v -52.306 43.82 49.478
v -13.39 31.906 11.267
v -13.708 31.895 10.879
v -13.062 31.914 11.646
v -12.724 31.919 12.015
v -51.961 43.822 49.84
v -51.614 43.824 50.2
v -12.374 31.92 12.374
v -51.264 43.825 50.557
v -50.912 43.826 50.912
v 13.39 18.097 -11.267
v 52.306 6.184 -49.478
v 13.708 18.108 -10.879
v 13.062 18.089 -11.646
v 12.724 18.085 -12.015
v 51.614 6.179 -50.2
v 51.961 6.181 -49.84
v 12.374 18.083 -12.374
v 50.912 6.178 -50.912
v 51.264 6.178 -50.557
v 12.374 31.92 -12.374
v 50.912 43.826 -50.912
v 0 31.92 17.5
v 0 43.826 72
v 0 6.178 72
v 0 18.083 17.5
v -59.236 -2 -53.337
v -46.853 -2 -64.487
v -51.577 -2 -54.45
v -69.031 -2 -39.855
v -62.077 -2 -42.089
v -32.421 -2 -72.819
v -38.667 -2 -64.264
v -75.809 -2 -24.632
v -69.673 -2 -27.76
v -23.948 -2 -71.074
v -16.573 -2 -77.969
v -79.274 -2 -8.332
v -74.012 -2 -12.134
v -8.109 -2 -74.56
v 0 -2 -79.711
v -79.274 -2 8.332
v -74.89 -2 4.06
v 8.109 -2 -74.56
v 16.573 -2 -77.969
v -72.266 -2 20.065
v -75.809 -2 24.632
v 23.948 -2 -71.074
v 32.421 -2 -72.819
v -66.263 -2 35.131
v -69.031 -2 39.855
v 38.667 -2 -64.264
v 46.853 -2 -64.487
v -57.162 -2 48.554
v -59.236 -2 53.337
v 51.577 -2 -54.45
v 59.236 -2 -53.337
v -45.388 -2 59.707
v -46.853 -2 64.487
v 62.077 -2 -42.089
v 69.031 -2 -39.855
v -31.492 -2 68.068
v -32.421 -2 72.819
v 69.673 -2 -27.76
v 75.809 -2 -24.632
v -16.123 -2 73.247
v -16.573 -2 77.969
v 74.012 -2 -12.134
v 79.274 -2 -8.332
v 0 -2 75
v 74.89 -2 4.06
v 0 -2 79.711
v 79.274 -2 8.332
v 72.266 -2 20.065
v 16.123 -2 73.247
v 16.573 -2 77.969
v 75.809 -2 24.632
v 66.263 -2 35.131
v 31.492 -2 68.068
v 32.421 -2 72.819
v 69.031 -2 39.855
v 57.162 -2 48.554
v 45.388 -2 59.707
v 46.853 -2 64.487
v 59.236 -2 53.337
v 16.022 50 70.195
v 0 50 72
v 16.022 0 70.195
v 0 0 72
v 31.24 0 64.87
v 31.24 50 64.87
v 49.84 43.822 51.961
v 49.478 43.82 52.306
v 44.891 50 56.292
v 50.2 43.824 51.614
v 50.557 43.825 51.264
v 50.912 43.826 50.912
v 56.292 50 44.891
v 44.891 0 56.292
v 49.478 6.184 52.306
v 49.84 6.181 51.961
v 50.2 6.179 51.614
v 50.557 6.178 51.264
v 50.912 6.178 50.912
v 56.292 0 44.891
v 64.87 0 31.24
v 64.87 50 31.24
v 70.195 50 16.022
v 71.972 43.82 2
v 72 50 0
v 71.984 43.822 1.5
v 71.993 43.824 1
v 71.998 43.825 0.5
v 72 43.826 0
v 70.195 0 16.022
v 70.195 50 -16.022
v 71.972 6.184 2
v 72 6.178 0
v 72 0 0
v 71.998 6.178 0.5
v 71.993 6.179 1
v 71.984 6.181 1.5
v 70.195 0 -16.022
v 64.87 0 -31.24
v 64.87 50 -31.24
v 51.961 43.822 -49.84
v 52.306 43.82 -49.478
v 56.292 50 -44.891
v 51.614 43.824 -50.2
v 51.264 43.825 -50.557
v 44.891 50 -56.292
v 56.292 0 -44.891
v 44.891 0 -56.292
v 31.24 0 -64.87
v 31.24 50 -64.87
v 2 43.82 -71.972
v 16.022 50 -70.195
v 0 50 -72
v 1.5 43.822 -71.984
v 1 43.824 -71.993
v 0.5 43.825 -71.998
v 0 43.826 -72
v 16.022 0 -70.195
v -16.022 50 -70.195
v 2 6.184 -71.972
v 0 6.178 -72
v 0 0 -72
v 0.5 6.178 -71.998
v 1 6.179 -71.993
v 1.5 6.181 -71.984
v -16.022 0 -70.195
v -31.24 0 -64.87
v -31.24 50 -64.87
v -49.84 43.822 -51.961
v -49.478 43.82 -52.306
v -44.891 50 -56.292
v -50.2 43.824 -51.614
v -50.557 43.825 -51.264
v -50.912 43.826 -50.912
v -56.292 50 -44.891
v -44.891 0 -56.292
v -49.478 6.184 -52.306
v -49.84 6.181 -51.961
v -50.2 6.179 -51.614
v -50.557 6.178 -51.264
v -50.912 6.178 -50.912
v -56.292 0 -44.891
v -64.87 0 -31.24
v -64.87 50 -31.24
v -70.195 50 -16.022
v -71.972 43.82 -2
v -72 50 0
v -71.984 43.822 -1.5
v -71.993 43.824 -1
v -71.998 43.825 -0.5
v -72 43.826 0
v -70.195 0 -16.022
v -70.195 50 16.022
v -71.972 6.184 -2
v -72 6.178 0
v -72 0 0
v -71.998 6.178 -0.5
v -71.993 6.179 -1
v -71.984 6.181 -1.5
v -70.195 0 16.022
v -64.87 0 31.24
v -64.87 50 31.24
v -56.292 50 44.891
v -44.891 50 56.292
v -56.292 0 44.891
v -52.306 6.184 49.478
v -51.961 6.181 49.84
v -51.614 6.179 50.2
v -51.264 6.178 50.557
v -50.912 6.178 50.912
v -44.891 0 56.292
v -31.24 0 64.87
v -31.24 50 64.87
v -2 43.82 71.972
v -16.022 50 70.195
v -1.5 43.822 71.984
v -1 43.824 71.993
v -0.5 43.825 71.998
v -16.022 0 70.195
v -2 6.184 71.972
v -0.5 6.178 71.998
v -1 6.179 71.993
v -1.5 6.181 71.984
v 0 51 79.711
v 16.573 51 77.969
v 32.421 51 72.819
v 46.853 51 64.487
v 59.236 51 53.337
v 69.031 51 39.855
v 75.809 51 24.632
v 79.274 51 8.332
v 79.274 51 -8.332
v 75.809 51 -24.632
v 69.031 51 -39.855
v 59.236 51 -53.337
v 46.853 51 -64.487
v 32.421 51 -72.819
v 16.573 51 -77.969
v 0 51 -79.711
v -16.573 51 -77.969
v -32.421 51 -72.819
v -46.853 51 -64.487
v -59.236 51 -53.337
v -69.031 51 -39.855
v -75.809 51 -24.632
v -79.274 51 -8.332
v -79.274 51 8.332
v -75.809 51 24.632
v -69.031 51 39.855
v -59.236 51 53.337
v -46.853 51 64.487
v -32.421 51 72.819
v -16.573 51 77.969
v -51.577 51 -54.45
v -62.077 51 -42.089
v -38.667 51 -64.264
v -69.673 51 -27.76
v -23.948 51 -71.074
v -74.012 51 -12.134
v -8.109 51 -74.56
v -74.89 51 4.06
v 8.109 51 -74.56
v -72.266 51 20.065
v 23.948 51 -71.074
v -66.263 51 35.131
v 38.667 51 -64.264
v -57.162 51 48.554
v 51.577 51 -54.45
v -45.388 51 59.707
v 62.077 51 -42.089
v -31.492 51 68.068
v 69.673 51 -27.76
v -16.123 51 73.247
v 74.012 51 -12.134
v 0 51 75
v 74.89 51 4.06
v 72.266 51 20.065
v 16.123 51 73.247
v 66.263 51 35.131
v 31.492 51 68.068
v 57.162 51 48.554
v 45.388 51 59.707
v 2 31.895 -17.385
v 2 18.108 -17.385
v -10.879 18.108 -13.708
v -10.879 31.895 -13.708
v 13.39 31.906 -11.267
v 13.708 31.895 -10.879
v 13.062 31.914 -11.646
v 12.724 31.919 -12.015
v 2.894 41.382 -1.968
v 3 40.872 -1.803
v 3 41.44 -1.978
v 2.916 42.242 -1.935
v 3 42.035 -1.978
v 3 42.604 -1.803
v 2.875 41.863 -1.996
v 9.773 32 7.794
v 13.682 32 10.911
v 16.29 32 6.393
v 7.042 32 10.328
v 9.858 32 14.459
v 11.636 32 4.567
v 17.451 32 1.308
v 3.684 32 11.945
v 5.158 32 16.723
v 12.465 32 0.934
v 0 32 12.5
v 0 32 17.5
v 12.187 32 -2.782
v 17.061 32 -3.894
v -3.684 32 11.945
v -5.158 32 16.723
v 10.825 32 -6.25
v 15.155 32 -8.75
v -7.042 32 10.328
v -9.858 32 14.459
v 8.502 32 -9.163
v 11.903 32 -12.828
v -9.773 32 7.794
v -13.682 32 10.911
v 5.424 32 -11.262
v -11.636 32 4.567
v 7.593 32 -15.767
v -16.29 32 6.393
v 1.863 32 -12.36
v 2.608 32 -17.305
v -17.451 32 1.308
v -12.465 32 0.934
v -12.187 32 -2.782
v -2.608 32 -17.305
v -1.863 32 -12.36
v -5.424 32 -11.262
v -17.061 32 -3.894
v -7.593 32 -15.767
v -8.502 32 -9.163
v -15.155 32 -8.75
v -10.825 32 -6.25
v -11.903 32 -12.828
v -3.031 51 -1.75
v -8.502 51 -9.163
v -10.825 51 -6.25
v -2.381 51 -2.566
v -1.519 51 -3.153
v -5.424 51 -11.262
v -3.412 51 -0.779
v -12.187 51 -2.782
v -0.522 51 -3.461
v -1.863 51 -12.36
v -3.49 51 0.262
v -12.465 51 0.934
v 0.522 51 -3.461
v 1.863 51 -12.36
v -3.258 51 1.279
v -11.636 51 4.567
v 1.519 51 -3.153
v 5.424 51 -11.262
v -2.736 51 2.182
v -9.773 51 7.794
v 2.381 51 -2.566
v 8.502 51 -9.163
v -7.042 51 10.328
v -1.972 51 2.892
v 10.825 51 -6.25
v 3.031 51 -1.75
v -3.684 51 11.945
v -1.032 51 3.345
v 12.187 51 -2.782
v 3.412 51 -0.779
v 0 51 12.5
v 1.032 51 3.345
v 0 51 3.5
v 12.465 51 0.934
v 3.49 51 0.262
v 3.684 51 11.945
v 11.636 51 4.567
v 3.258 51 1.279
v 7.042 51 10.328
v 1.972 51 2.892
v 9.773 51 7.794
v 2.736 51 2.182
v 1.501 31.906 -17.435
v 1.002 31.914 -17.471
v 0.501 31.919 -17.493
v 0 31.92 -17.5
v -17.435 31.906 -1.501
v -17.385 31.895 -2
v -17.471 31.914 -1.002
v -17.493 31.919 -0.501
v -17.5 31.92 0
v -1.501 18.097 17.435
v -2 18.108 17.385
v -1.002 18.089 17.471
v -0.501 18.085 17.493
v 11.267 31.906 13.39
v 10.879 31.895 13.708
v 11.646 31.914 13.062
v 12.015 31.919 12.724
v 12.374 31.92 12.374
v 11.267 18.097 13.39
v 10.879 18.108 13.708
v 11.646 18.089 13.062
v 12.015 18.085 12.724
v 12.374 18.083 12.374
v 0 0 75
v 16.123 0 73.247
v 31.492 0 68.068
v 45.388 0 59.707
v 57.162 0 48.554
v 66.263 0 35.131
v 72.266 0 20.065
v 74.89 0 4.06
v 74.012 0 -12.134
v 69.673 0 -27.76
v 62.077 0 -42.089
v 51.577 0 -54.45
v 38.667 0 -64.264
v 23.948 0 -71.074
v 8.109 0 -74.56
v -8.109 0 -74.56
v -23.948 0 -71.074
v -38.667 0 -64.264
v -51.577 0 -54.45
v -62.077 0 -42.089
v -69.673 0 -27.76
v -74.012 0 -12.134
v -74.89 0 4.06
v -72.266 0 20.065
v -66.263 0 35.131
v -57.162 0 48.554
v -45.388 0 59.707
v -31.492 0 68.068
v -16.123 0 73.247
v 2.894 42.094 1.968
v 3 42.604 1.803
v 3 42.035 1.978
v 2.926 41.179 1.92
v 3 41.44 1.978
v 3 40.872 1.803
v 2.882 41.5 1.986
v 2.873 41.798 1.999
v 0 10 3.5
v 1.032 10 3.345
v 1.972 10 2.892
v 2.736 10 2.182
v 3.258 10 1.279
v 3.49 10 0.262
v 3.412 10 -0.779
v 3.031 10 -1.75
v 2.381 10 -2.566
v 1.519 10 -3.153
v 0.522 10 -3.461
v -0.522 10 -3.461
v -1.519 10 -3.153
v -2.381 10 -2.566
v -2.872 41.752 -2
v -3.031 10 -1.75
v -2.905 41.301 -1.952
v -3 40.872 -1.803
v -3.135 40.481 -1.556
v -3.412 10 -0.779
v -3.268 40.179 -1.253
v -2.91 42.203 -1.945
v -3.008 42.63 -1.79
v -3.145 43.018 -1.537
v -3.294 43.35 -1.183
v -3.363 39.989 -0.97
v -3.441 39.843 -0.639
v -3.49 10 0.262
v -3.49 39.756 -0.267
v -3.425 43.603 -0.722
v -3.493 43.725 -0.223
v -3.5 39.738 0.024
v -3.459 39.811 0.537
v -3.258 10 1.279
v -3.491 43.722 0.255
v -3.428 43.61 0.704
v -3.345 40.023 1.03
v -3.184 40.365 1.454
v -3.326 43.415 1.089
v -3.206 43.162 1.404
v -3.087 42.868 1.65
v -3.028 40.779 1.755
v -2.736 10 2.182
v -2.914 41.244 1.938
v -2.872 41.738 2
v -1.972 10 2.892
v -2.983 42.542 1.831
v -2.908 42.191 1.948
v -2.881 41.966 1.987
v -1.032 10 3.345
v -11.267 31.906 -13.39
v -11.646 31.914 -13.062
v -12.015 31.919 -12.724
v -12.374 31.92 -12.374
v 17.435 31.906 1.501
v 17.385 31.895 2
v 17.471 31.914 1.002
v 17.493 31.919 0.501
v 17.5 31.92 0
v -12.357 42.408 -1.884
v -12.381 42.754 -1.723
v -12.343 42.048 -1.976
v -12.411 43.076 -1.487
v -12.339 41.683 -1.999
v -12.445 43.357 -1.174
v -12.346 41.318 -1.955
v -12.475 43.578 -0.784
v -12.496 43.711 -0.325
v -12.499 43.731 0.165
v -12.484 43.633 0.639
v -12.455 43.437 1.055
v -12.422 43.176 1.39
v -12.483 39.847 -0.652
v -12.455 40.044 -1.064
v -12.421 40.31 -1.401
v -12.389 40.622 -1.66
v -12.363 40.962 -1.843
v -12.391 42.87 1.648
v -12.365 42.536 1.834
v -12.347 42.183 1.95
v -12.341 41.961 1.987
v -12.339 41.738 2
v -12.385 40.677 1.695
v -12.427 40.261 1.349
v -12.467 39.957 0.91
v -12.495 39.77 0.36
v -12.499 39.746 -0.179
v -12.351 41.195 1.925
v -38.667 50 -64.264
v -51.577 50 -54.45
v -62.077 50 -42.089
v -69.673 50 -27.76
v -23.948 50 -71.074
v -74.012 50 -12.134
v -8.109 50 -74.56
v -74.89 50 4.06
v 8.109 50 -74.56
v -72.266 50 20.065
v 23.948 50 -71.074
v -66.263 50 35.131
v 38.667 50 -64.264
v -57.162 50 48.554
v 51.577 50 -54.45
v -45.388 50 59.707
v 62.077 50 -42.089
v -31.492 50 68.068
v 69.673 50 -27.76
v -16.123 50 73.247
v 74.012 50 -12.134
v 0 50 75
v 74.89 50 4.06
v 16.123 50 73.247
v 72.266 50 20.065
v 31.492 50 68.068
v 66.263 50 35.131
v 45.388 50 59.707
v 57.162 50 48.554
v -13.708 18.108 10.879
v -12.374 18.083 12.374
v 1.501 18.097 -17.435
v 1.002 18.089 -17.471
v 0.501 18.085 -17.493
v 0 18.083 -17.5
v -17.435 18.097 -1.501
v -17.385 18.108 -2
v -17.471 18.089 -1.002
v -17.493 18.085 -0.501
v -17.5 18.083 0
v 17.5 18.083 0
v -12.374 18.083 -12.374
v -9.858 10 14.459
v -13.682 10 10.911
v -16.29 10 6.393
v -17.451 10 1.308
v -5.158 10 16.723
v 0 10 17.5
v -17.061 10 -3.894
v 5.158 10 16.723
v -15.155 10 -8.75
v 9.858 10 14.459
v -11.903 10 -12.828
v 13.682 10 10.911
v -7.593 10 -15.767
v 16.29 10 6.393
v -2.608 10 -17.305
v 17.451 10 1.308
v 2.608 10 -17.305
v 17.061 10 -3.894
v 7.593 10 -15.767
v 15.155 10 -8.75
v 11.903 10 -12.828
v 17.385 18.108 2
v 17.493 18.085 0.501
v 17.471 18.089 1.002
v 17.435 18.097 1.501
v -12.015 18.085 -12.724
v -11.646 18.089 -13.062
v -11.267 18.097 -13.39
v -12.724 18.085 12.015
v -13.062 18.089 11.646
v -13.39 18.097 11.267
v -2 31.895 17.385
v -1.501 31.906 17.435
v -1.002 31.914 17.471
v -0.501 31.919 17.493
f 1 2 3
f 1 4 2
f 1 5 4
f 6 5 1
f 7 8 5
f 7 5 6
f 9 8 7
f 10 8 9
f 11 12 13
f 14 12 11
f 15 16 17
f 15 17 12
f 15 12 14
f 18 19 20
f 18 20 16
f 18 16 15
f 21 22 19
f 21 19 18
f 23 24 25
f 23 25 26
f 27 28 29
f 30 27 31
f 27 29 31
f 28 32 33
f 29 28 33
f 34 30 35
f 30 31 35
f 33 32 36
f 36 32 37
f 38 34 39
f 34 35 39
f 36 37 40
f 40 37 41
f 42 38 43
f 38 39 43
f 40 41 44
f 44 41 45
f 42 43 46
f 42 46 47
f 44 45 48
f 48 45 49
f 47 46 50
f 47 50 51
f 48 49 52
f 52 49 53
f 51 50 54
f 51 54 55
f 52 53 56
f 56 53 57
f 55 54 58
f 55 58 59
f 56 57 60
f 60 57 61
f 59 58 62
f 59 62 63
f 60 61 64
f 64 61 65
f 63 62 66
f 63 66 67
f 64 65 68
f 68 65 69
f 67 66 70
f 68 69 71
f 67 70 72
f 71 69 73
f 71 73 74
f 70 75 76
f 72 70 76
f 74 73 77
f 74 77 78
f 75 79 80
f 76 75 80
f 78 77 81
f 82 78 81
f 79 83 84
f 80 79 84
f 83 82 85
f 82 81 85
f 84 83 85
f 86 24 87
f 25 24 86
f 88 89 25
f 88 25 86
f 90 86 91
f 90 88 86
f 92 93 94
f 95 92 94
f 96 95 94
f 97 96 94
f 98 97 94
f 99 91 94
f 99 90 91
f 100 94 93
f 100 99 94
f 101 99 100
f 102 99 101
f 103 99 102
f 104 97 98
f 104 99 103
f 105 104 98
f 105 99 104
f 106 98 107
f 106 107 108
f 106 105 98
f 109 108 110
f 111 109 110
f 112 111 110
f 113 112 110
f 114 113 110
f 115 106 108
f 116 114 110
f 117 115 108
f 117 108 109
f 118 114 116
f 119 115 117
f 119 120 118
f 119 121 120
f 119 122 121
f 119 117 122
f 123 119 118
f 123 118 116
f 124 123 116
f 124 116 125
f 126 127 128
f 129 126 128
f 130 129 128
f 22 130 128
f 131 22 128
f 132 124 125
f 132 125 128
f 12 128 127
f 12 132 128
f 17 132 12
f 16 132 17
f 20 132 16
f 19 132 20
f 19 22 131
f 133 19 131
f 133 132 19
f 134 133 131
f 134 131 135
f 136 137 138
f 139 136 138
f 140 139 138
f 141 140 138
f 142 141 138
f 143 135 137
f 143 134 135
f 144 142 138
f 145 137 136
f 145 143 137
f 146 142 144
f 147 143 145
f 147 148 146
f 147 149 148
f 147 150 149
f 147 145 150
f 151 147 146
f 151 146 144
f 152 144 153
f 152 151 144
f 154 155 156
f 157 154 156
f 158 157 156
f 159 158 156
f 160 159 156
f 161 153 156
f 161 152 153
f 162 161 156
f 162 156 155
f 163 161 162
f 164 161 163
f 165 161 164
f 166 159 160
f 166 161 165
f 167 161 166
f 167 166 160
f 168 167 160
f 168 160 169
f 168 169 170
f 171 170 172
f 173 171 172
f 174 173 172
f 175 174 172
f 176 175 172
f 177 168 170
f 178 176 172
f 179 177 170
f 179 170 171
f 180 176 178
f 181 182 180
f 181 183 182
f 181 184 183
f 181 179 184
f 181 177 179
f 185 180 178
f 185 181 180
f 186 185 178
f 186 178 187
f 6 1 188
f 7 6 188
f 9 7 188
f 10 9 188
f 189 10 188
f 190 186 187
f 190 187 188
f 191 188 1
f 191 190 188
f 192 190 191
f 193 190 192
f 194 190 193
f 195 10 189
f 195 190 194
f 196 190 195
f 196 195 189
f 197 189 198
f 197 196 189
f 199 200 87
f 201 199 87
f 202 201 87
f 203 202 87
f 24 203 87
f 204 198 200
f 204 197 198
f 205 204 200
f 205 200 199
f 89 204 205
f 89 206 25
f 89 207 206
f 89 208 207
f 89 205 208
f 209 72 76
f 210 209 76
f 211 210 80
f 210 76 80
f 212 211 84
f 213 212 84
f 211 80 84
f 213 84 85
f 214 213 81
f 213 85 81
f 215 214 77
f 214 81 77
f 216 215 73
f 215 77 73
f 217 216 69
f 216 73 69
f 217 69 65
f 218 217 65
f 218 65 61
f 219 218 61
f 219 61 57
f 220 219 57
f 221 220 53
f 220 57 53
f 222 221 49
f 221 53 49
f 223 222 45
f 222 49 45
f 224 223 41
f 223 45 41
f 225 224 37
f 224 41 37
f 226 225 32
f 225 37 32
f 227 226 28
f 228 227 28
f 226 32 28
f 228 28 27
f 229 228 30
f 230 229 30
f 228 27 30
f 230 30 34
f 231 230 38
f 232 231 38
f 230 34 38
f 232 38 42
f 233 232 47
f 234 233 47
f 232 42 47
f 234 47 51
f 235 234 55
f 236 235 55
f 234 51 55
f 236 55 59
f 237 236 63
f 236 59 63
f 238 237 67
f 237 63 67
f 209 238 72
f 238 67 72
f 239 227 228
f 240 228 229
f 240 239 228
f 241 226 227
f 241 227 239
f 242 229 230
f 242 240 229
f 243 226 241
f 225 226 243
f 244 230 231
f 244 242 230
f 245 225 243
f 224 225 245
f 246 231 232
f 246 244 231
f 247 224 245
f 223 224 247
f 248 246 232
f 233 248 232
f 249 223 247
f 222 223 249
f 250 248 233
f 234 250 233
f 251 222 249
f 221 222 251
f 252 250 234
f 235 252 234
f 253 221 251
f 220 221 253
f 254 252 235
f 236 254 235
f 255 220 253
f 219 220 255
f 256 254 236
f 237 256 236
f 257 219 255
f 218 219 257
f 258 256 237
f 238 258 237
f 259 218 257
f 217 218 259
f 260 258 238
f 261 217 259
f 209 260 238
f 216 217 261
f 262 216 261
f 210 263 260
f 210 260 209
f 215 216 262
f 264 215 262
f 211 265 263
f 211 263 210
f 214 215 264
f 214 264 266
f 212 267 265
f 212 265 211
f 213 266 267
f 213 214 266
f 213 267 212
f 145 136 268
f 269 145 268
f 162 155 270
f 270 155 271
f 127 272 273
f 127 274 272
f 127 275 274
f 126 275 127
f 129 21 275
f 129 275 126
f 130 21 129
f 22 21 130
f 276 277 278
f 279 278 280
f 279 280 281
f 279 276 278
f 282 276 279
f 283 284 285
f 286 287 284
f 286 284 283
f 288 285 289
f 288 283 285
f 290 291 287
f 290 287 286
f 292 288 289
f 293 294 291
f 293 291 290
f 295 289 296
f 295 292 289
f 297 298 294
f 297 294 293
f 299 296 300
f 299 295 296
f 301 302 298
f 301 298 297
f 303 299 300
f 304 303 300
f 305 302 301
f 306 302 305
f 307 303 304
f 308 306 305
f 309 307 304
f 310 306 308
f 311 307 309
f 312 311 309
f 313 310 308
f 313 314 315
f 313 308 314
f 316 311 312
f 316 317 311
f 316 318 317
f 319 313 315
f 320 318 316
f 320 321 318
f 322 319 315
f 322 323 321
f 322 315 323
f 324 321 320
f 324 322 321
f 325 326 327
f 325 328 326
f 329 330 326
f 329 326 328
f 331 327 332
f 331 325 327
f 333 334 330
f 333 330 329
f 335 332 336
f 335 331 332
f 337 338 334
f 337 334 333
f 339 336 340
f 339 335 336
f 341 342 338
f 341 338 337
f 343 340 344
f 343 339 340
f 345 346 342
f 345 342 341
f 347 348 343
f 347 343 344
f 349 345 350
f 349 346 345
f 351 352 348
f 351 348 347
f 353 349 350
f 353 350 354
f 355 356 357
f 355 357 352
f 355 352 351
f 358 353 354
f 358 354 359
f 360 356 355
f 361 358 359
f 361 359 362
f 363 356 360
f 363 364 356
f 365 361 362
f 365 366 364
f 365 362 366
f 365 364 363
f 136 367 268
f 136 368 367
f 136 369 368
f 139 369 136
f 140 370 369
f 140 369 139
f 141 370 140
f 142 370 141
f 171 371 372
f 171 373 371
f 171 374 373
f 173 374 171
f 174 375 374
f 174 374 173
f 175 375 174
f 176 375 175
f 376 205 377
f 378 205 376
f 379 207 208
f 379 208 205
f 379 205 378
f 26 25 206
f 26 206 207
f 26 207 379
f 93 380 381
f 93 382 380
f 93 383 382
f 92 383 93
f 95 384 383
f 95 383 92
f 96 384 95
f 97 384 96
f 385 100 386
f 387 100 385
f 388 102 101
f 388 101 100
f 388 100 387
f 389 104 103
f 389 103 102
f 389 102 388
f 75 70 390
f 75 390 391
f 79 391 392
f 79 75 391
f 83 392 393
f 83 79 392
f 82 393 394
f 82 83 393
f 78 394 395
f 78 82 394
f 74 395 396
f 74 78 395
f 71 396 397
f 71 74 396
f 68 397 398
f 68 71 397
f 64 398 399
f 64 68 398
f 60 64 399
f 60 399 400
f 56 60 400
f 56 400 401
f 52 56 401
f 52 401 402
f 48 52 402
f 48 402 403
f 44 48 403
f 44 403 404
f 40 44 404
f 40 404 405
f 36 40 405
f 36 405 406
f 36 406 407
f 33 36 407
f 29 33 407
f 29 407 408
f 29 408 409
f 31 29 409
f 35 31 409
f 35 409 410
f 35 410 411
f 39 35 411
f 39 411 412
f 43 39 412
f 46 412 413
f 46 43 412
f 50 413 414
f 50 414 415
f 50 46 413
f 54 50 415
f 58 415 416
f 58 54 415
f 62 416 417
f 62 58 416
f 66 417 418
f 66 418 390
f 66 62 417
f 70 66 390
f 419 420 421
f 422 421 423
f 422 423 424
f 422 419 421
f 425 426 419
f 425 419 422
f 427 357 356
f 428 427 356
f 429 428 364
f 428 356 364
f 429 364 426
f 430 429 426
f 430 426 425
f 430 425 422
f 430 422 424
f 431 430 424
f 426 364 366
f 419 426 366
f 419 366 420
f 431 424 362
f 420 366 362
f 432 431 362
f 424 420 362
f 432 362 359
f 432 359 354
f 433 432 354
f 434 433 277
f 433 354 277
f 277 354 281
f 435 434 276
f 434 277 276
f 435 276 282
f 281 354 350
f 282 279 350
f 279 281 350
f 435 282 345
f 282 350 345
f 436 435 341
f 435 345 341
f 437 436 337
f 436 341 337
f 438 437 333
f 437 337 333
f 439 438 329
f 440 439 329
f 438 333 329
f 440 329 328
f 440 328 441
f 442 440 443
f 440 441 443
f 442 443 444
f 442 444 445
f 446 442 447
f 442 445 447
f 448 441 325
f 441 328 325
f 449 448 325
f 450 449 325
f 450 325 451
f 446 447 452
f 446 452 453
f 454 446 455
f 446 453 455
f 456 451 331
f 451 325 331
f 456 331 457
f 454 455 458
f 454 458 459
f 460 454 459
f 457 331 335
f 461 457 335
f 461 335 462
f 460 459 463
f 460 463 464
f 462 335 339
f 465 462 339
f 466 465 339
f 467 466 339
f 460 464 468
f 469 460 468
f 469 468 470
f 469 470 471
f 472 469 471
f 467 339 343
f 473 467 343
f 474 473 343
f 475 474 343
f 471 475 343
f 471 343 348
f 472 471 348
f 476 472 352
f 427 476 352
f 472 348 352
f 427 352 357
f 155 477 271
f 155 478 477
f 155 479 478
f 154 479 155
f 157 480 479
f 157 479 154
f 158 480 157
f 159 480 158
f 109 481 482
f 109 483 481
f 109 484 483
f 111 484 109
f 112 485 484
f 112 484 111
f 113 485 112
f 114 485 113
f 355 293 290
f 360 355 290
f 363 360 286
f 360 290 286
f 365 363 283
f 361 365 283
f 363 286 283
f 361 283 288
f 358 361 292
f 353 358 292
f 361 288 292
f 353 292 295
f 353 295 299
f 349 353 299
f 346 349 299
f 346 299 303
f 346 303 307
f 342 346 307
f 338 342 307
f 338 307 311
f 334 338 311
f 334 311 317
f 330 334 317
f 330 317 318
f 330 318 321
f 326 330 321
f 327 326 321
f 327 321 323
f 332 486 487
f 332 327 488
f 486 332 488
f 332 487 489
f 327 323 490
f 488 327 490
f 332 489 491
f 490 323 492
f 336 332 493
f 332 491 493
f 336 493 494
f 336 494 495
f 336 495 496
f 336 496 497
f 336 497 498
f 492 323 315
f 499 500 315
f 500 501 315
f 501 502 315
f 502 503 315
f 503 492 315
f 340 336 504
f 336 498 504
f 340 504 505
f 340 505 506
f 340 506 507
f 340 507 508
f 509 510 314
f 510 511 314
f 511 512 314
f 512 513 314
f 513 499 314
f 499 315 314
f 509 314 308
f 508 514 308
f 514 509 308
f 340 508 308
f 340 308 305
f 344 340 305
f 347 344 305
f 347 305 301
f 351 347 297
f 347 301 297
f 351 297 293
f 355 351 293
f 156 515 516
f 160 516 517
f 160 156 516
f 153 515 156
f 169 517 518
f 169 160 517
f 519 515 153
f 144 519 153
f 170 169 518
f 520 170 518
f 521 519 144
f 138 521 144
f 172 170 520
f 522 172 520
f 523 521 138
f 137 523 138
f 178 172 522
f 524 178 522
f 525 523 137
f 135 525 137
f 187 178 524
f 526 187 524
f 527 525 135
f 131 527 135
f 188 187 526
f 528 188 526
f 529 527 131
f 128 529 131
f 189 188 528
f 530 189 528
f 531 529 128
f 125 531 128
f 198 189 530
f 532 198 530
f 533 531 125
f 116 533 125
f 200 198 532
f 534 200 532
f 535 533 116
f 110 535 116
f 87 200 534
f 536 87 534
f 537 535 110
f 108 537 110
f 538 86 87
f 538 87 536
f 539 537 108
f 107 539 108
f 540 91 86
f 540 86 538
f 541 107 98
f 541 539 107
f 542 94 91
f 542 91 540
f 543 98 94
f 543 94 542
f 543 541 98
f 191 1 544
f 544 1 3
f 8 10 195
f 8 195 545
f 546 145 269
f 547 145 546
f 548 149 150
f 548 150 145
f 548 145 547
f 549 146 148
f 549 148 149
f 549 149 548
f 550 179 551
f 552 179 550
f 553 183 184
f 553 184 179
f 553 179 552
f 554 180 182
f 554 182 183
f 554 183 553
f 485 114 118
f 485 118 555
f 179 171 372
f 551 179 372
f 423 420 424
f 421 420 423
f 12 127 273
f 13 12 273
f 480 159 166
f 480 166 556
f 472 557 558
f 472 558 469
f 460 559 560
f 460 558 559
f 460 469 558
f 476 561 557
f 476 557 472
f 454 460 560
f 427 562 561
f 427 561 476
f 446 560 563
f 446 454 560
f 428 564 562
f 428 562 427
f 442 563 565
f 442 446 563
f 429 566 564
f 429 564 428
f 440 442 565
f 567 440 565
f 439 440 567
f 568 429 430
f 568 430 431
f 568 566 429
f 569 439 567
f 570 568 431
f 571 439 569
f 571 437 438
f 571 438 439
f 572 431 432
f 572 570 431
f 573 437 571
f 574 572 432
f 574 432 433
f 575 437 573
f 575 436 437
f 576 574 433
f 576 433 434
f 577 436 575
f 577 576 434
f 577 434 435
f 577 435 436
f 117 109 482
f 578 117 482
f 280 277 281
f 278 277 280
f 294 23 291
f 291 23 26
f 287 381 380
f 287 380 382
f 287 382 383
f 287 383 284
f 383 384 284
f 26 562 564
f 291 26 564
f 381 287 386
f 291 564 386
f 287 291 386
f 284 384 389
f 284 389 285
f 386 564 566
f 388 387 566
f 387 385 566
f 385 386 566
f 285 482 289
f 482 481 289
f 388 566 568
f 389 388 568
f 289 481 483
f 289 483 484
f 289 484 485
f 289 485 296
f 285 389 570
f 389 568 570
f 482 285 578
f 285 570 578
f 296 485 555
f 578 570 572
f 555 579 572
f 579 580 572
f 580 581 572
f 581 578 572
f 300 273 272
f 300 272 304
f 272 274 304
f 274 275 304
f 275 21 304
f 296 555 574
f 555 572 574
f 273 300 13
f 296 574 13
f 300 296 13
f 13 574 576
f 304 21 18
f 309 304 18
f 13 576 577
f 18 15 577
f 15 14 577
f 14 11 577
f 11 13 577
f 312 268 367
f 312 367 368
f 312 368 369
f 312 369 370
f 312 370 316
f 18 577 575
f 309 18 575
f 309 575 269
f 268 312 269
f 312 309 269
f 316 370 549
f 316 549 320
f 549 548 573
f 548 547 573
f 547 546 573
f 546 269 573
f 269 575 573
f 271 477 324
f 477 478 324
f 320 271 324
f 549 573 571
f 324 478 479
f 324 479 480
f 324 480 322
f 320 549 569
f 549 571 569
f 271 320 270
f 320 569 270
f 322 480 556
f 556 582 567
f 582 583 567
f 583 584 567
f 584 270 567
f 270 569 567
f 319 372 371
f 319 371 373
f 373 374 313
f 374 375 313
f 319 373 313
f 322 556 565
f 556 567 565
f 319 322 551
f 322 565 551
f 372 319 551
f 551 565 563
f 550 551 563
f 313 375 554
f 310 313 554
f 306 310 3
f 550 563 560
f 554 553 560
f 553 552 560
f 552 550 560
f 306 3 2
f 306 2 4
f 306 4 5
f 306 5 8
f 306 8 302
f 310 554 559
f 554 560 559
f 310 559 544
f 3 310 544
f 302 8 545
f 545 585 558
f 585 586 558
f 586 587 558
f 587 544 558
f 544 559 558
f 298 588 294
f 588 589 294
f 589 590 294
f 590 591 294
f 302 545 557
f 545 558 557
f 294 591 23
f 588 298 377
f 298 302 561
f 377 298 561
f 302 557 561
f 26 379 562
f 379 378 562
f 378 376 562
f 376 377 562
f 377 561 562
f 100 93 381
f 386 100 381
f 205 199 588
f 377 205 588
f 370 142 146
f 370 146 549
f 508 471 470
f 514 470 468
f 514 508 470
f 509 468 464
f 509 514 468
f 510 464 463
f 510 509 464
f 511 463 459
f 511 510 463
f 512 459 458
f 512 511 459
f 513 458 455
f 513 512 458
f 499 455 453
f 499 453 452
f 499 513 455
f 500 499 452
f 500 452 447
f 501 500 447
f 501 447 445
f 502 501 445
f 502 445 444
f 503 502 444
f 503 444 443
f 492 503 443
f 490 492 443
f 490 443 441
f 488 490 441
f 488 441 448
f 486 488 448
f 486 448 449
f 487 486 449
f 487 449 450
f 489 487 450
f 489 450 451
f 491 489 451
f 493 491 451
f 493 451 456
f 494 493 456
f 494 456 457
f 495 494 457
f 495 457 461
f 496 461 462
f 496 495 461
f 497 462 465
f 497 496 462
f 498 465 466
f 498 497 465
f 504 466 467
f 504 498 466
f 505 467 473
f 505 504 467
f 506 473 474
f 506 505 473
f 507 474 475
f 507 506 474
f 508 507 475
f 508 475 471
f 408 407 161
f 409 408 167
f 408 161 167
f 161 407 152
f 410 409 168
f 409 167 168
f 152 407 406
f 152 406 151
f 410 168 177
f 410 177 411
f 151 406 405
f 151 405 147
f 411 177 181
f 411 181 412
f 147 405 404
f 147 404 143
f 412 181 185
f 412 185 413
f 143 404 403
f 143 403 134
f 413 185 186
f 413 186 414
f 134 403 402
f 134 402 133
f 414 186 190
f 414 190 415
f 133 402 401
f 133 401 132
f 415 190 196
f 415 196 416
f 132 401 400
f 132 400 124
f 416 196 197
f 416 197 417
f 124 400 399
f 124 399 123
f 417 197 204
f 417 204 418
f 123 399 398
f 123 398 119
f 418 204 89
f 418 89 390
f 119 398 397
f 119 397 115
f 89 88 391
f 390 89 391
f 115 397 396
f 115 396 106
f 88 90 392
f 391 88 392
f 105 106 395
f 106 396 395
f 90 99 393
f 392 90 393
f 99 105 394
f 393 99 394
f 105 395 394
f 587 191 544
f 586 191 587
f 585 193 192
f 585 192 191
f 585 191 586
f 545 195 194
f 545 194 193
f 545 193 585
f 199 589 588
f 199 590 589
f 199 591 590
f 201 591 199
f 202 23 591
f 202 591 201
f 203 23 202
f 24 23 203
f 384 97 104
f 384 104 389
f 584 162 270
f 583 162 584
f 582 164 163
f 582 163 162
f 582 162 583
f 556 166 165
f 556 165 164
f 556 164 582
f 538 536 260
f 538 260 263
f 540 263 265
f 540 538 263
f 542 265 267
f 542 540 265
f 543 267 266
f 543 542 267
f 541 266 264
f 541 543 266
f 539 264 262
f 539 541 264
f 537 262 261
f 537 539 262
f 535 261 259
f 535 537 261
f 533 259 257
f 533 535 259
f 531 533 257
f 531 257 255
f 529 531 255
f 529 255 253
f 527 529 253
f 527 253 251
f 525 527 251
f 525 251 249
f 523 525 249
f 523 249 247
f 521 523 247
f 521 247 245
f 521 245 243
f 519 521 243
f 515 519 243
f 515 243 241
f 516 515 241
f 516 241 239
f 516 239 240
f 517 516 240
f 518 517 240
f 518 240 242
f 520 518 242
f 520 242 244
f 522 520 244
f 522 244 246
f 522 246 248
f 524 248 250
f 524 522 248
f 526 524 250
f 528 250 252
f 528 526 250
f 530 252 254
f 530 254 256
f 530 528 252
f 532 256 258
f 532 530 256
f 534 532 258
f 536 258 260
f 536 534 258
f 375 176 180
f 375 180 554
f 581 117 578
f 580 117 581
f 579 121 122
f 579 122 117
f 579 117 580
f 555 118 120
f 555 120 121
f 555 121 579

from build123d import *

# Parameters (mm, degrees)
SKETCH1_R                = 17.5
BOSS_EXTRUDE1_DEPTH      = 50
SKETCH1_R_2              = 75
SKETCH1_R_3              = 72
BOSS_EXTRUDE1_2_DEPTH    = 50
SKETCH2_R                = 17.5
CUT_EXTRUDE1_DEPTH       = 10
BOSS_EXTRUDE2_DEPTH      = 2
CIRPATTERN1_COUNT        = 8
CUT_EXTRUDE2_START       = -8
SKETCH4_R                = 17.5
CUT_EXTRUDE2_DEPTH       = 8
SKETCH6_R                = 12.5
BOSS_EXTRUDE3_DEPTH      = 19
SKETCH7_R                = 3.5
CUT_EXTRUDE3_DEPTH       = 42
CUT_EXTRUDE4_DEPTH       = 3
CUT_EXTRUDE4_DEPTH_BACK  = 18
SKETCH8_R                = 2
BOSS_EXTRUDE4_DEPTH      = 51
BOSS_EXTRUDE4_DEPTH_BACK = 2
SKETCH9_R                = 79.710570968
SKETCH9_R_2              = 75


with BuildPart() as part:
    # Sketch1 → Boss-Extrude1 (new body)
    with BuildSketch(Plane(origin=(0, 0, 0), x_dir=(1, 0, 0), z_dir=(0, 1, 0))):
        with Locations(Location((0, 0, 0), (0, 0, 270))):
            Circle(SKETCH1_R)
    extrude(amount=BOSS_EXTRUDE1_DEPTH)

    # Sketch2 → Cut-Extrude1 (cut)
    with BuildSketch(Plane.XZ):
        with Locations(Location((0, 0, 0), (0, 0, 270))):
            Circle(SKETCH2_R)
    cut_extrude1 = extrude(amount=-CUT_EXTRUDE1_DEPTH, mode=Mode.SUBTRACT)

    # Mirror1: Cut-Extrude1 across plane
    add(cut_extrude1.mirror(Plane.ZX.offset(25)), mode=Mode.SUBTRACT)

    # Sketch4 → Cut-Extrude2 (cut)
    with BuildSketch(Plane(origin=(0, 40, 0), x_dir=(1, 0, 0), z_dir=(0, 1, 0)).offset(CUT_EXTRUDE2_START)):
        with Locations(Location((0, 0, 0), (0, 0, 90))):
            Circle(SKETCH4_R)
    extrude(amount=CUT_EXTRUDE2_DEPTH, mode=Mode.SUBTRACT)


with BuildPart() as body_2:
    # Sketch1 → Boss-Extrude1 2 (new body)
    with BuildSketch(Plane(origin=(0, 0, 0), x_dir=(1, 0, 0), z_dir=(0, 1, 0))):
        with Locations(Location((0, 0, 0), (0, 0, 270))):
            Circle(SKETCH1_R_2)
        with Locations(Location((0, 0, 0), (0, 0, 270))):
            Circle(SKETCH1_R_3, mode=Mode.SUBTRACT)
    extrude(amount=BOSS_EXTRUDE1_2_DEPTH)

    # Sketch3 → Boss-Extrude2 (add)
    with BuildSketch(Plane(origin=(0, 0, 0), x_dir=(0, 0, -1), z_dir=(1, 0, 0))):
        Polygon((16.718472528, 18.253836478), (16.718472528, 31.749663618), (73.745525638, 44.207029589), (73.745525638, 5.796470507), align=None)
    boss_extrude2 = extrude(amount=BOSS_EXTRUDE2_DEPTH)

    # CirPattern1: Boss-Extrude2 ×8 about axis
    cirpattern1_axis = Axis((0, 0, 0), (0, 1, 0))
    for i in range(1, CIRPATTERN1_COUNT):
        add(boss_extrude2.rotate(cirpattern1_axis, i * 360 / CIRPATTERN1_COUNT))


    add(part.part)  # Boss-Extrude3 merges part
    # Sketch6 → Boss-Extrude3 (add)
    with BuildSketch(Plane(origin=(0, 32, 0), x_dir=(1, 0, 0), z_dir=(0, 1, 0))):
        with Locations(Location((0, 0, 0), (0, 0, 270))):
            Circle(SKETCH6_R)
    extrude(amount=BOSS_EXTRUDE3_DEPTH)

    # Sketch7 → Cut-Extrude3 (cut)
    with BuildSketch(Plane(origin=(0, 51, 0), x_dir=(1, 0, 0), z_dir=(0, 1, 0))):
        with Locations(Location((0, 0, 0), (0, 0, 270))):
            Circle(SKETCH7_R)
    extrude(amount=-CUT_EXTRUDE3_DEPTH, mode=Mode.SUBTRACT)

    # Sketch8 → Cut-Extrude4 (cut, two sides: drawn at the far end of the back side and taken through both)
    with BuildSketch(Plane(origin=(0, 0, 0), x_dir=(0, 0, -1), z_dir=(1, 0, 0)).offset(-CUT_EXTRUDE4_DEPTH_BACK)):
        with Locations(Location((0, 41.737851991, 0), (0, 0, 180))):
            Circle(SKETCH8_R)
    extrude(amount=CUT_EXTRUDE4_DEPTH + CUT_EXTRUDE4_DEPTH_BACK, mode=Mode.SUBTRACT)

    # Sketch9 → Boss-Extrude4 (add, two sides: drawn at the far end of the back side and taken through both)
    with BuildSketch(Plane(origin=(0, 0, 0), x_dir=(1, 0, 0), z_dir=(0, 1, 0)).offset(-BOSS_EXTRUDE4_DEPTH_BACK)):
        with Locations(Location((0, 0, 0), (0, 0, 270))):
            Circle(SKETCH9_R)
        with Locations(Location((0, 0, 0), (0, 0, 270))):
            Circle(SKETCH9_R_2, mode=Mode.SUBTRACT)
    extrude(amount=BOSS_EXTRUDE4_DEPTH + BOSS_EXTRUDE4_DEPTH_BACK)


solid = body_2.part
